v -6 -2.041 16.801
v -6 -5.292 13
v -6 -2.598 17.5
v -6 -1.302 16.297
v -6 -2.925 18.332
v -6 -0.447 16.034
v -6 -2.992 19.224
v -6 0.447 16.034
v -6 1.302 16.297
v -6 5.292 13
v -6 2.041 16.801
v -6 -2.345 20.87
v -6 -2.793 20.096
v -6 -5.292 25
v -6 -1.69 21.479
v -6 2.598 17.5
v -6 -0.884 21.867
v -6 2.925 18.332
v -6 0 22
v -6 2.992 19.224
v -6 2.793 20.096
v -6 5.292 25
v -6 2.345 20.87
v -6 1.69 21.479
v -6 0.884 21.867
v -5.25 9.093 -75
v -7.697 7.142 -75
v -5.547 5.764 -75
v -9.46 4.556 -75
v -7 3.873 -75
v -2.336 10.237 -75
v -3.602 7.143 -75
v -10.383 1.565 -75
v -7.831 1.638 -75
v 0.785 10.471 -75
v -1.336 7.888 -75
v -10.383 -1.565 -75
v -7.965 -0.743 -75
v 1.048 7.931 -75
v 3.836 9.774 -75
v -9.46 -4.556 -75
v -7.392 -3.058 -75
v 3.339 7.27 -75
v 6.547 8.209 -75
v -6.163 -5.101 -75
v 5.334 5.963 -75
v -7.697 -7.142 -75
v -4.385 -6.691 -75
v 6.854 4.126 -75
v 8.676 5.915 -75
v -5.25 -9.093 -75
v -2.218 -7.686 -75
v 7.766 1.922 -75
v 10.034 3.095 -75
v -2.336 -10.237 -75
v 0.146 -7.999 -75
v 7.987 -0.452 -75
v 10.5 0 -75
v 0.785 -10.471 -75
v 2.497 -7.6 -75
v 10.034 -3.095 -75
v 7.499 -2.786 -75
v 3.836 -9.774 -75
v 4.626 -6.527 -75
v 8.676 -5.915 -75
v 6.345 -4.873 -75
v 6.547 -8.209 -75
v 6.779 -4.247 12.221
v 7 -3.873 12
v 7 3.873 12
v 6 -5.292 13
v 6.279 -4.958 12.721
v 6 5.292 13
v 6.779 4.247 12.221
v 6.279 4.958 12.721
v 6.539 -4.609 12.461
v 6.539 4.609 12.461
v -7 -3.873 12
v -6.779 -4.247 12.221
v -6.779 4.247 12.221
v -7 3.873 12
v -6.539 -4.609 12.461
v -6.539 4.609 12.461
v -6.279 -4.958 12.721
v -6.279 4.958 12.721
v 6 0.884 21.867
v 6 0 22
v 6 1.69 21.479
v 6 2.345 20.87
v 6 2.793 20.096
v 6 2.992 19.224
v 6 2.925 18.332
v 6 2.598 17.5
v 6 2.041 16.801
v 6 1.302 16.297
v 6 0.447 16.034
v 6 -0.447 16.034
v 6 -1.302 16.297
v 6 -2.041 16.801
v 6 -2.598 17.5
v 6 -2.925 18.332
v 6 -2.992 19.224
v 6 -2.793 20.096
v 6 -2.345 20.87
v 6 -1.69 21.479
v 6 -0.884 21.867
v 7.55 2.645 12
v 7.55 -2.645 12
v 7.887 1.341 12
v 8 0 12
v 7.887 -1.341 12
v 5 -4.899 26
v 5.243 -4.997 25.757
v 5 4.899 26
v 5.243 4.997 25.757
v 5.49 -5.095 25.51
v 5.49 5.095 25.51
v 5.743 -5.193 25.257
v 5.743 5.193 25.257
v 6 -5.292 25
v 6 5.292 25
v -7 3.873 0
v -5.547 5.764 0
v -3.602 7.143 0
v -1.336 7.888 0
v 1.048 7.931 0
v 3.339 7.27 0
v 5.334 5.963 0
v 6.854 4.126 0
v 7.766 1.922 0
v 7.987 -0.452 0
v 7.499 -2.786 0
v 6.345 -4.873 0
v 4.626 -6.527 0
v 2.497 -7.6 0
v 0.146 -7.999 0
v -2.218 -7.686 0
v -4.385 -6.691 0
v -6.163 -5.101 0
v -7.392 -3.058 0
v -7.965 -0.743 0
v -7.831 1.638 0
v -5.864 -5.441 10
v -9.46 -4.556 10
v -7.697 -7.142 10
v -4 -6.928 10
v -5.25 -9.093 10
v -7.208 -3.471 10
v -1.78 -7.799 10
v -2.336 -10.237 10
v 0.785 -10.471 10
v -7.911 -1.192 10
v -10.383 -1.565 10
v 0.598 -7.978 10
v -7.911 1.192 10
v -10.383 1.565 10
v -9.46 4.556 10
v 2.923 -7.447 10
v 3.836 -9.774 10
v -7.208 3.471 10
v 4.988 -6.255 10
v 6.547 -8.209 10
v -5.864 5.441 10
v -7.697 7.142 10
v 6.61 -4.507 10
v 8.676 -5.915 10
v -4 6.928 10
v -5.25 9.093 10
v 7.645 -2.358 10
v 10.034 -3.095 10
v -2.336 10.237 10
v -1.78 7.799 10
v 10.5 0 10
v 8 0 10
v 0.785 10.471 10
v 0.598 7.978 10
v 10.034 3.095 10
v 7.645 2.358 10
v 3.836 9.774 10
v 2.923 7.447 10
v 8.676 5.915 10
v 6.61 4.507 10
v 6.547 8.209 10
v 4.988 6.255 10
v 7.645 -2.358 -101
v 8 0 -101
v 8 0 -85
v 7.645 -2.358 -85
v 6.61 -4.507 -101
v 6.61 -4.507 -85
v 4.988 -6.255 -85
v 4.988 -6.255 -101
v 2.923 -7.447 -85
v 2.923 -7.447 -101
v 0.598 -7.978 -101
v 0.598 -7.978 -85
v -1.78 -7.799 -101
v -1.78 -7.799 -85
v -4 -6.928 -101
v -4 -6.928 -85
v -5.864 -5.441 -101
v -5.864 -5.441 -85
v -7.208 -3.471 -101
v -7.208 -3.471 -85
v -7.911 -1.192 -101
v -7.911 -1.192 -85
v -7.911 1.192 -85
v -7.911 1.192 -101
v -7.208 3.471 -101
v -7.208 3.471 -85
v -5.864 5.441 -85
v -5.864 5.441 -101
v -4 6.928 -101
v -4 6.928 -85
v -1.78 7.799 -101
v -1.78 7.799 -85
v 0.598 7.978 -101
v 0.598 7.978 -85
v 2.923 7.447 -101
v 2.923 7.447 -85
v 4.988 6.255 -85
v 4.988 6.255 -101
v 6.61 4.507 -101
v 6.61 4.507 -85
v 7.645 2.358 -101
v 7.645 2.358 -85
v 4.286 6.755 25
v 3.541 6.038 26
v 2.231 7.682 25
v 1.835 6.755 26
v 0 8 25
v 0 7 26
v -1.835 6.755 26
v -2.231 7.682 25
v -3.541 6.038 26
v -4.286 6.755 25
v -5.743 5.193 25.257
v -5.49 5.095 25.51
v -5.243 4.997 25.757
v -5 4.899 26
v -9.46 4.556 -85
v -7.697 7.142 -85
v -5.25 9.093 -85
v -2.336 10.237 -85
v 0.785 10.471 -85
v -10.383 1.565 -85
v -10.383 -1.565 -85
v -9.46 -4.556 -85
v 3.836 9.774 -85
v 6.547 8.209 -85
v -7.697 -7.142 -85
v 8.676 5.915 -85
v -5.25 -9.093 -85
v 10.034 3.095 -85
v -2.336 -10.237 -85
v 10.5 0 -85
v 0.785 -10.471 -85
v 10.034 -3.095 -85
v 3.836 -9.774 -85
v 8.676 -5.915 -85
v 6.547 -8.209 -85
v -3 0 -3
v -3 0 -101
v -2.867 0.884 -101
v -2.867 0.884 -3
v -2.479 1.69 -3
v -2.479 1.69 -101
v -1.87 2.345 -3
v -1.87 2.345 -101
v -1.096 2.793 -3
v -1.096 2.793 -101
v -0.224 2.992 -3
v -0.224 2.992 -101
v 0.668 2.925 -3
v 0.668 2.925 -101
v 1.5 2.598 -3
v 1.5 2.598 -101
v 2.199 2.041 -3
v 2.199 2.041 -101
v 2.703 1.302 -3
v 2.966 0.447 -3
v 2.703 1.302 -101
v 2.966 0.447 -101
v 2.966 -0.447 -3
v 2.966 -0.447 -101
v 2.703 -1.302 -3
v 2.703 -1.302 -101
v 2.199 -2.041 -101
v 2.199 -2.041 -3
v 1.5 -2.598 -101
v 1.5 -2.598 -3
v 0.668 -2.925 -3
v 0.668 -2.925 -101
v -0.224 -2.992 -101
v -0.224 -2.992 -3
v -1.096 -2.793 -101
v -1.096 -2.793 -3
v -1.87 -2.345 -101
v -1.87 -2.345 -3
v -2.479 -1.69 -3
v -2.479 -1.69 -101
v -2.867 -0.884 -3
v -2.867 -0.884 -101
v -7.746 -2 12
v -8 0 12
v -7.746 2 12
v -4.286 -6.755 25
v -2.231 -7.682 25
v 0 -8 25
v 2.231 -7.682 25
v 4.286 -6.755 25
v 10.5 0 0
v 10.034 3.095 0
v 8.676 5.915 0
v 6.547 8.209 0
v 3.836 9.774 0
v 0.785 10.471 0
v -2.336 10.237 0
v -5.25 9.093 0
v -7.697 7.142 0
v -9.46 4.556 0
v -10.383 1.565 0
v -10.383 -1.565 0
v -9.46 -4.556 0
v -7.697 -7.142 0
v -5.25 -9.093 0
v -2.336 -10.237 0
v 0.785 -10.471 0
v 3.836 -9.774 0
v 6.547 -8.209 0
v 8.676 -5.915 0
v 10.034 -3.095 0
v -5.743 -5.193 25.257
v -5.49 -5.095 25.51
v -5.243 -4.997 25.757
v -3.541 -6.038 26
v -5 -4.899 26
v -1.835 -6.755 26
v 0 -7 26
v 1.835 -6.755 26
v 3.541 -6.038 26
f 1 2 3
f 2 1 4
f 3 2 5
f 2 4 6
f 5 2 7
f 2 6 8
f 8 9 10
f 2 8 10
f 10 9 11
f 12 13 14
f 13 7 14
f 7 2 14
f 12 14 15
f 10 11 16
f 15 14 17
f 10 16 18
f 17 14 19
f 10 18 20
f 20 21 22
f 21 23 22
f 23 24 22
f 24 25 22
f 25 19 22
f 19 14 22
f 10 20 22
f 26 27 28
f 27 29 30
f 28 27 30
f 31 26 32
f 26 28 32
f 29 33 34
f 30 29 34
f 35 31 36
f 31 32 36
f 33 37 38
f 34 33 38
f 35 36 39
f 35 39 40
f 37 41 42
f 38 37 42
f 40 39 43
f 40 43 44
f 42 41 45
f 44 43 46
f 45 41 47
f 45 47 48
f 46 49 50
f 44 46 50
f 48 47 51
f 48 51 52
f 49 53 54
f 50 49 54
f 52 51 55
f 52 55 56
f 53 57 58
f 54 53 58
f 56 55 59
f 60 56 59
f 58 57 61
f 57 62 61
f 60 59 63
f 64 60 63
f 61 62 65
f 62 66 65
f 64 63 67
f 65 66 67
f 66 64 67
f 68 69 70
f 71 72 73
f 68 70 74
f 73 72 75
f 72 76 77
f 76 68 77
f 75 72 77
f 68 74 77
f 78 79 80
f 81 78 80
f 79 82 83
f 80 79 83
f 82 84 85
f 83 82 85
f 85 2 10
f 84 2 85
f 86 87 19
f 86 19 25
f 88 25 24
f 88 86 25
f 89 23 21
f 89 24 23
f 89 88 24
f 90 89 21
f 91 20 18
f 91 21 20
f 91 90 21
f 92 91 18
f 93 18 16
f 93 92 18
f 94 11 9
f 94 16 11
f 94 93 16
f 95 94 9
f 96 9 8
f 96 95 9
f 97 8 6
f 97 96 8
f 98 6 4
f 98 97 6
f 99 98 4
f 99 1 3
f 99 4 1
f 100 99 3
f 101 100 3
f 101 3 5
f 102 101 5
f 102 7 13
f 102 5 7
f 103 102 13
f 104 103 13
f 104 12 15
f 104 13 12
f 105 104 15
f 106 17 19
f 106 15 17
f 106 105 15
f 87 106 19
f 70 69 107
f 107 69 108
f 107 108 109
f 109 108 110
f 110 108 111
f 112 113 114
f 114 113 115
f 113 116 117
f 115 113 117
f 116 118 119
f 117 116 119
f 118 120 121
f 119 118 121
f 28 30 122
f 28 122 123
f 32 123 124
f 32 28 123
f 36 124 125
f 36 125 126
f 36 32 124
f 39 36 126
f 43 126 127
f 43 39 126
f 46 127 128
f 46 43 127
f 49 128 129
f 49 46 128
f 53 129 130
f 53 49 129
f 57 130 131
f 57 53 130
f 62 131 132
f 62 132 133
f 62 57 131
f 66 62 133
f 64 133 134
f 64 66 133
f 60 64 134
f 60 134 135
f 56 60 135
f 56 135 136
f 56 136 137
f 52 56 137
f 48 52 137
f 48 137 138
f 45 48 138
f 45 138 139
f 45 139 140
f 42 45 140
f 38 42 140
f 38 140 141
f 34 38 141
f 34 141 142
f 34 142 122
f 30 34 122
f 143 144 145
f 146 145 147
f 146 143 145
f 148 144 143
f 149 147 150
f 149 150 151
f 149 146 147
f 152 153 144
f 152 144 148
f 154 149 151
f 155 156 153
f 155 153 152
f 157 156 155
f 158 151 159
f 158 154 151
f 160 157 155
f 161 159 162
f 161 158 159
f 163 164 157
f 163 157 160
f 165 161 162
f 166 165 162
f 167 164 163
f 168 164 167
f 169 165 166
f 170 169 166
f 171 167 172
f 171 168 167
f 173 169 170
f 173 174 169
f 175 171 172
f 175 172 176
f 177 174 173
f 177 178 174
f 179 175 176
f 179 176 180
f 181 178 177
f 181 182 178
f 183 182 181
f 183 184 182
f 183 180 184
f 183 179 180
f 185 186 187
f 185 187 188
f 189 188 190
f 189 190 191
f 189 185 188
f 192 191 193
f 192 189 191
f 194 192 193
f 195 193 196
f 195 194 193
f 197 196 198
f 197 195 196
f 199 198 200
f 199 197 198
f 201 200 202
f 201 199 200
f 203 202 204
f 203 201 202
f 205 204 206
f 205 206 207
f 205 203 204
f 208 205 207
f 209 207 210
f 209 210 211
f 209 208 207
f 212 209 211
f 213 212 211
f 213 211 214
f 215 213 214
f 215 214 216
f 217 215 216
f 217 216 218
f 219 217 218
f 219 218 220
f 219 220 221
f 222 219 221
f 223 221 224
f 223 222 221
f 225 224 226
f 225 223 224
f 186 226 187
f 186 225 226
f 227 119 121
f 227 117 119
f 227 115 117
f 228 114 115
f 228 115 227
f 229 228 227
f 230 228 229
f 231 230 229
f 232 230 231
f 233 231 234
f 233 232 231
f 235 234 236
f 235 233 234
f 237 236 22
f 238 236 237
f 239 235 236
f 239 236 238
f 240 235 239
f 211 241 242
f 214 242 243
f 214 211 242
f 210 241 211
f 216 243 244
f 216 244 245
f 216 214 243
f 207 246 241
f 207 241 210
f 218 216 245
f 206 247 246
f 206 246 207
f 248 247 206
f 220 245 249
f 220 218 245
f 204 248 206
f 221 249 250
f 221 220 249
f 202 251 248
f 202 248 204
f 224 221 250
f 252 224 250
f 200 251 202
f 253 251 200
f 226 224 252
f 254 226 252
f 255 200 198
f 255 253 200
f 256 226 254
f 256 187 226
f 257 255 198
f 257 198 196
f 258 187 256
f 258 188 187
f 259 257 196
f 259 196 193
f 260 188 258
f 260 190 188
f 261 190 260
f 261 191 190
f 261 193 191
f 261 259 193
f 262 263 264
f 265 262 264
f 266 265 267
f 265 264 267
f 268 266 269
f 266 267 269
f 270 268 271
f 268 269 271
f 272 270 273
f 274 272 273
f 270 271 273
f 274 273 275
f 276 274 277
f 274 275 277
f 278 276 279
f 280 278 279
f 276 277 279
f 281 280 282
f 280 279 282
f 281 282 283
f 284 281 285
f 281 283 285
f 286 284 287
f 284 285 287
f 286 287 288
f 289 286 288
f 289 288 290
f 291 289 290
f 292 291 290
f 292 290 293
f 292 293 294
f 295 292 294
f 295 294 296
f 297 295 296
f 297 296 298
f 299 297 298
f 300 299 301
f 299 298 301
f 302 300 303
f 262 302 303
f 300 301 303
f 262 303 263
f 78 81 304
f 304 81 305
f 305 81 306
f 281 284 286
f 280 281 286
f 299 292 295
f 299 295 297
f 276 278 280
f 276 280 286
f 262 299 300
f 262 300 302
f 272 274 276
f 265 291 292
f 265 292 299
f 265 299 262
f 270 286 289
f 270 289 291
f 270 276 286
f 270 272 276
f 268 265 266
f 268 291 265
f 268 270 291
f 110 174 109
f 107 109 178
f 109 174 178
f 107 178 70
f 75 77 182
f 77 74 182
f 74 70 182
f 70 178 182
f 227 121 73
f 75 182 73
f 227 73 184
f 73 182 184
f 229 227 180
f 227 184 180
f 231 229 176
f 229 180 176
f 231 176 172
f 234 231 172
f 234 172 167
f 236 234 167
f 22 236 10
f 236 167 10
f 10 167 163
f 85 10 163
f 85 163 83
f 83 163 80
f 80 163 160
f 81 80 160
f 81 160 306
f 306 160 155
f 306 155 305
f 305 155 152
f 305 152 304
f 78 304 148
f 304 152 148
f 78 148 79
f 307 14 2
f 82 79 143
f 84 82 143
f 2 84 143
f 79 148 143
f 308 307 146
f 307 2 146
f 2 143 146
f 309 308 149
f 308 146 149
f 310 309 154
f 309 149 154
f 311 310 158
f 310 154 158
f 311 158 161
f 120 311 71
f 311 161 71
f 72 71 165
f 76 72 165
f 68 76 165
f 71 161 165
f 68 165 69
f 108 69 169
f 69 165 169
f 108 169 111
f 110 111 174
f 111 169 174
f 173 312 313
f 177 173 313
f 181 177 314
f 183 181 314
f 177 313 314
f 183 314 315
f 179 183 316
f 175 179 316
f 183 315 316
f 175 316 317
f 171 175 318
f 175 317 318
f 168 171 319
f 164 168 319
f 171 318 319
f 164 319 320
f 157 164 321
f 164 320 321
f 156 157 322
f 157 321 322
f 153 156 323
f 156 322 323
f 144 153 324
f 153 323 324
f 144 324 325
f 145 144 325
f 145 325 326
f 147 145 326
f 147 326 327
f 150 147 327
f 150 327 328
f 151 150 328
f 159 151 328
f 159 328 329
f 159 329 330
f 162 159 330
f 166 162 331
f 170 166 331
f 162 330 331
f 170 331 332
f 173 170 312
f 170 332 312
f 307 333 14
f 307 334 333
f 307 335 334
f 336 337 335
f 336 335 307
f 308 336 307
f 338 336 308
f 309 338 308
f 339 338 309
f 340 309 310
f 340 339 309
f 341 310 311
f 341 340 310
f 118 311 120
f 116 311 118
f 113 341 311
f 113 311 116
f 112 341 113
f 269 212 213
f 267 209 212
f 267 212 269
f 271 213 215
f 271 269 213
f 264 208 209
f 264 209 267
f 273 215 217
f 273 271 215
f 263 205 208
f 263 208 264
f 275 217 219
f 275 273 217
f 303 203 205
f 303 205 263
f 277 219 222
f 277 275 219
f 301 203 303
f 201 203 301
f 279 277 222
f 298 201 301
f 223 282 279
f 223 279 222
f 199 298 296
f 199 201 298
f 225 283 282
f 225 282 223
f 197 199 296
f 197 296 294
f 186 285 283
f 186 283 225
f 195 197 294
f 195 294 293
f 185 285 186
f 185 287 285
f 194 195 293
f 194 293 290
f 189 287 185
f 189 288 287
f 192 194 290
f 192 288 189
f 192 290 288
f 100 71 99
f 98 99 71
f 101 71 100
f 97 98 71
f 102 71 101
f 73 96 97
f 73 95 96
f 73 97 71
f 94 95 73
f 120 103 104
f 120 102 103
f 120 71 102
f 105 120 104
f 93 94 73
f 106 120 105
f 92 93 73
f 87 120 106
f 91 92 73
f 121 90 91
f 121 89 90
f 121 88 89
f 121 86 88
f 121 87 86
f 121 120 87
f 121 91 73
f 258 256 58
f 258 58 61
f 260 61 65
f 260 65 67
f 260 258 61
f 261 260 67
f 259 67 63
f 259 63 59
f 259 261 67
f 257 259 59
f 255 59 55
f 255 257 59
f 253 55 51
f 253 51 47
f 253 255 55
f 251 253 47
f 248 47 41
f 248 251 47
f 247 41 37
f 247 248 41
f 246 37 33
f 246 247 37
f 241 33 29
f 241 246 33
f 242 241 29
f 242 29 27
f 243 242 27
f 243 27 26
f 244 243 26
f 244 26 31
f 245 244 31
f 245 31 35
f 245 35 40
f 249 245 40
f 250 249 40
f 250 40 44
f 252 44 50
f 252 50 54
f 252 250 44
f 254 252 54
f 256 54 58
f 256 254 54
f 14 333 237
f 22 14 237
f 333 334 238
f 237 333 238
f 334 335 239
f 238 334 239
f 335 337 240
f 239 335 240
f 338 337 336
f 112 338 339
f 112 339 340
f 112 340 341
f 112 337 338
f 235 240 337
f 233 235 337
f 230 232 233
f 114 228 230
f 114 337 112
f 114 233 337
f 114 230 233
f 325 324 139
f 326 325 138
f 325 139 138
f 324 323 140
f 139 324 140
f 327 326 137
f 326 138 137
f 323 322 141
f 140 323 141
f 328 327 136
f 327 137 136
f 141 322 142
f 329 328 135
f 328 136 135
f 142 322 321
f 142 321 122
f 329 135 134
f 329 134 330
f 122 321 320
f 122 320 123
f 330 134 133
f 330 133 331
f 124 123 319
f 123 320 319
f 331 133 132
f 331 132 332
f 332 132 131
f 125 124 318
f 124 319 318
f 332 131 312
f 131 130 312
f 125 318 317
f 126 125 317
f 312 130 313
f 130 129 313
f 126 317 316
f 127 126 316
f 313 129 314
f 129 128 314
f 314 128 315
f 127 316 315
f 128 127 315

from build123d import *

# Parameters (mm, degrees)
ESQUISSE1_R                  = 10.5
BOSS_EXTRU_1_DEPTH           = 10
ESQUISSE2_R                  = 8
BOSS_EXTRU_2_DEPTH           = 16
ESQUISSE3_W                  = 2
ESQUISSE3_H                  = 16
ENL_V_MAT_EXTRU_1_DEPTH      = 14
CHANFREIN1_SIZE              = 1
ENL_V_MAT_EXTRU_2_DEPTH      = 33.53459697
ENL_V_MAT_EXTRU_2_DEPTH_BACK = 33.53459697
ESQUISSE4_R                  = 3
BOSS_EXTRU_3_START           = 85
ESQUISSE5_R                  = 8
BOSS_EXTRU_3_DEPTH           = 85
ESQUISSE6_R                  = 10.5
BOSS_EXTRU_4_DEPTH           = 10
BOSS_EXTRU_5_START           = 16
ESQUISSE7_R                  = 8
BOSS_EXTRU_5_DEPTH           = 16
ESQUISSE8_R                  = 3
ENL_V_MAT_EXTRU_3_DEPTH      = 98


with BuildPart() as part:
    # Esquisse1 → Boss.-Extru.1 (new body)
    with BuildSketch(Plane.XY):
        Circle(ESQUISSE1_R)
    extrude(amount=BOSS_EXTRU_1_DEPTH)

    # Esquisse2 → Boss.-Extru.2 (add)
    with BuildSketch(Plane.XY.offset(10)):
        Circle(ESQUISSE2_R)
    extrude(amount=BOSS_EXTRU_2_DEPTH)

    # Esquisse3 → Enlèv. mat.-Extru.1 (cut)
    with BuildSketch(Plane.XY.offset(26)):
        with Locations((-7, 0)):
            Rectangle(ESQUISSE3_W, ESQUISSE3_H)
        with Locations((7, 0)):
            Rectangle(ESQUISSE3_W, ESQUISSE3_H)
    extrude(amount=-ENL_V_MAT_EXTRU_1_DEPTH, mode=Mode.SUBTRACT)

    # Chanfrein1
    chanfrein1_edges = [part.edges().sort_by_distance(p)[0] for p in [
        (0, -8, 26),
        (-6, 0, 26),
        (-6, 0, 12),
        (0, 8, 26),
        (6, 0, 26),
        (6, 0, 12),
    ]]
    chamfer(chanfrein1_edges, length=CHANFREIN1_SIZE)

    # Esquisse4 → Enlèv. mat.-Extru.2 (cut, two sides: drawn at the far end of the back side and taken through both)
    with BuildSketch(Plane.ZY.offset(6).offset(-ENL_V_MAT_EXTRU_2_DEPTH_BACK)):
        with Locations((19, 0)):
            Circle(ESQUISSE4_R)
    extrude(amount=ENL_V_MAT_EXTRU_2_DEPTH + ENL_V_MAT_EXTRU_2_DEPTH_BACK, mode=Mode.SUBTRACT)

    # Esquisse5 → Boss.-Extru.3 (add)
    with BuildSketch(Plane(origin=(0, 0, 0), x_dir=(-1, 0, 0), z_dir=(0, 0, -1)).offset(BOSS_EXTRU_3_START)):
        with Locations(Location((0, 0, 0), (0, 0, 28.955024372))):
            Circle(ESQUISSE5_R)
    extrude(amount=-BOSS_EXTRU_3_DEPTH)

    # Esquisse6 → Boss.-Extru.4 (add)
    with BuildSketch(Plane(origin=(0, 0, -85), x_dir=(-1, 0, 0), z_dir=(0, 0, -1))):
        with Locations(Location((0, 0, 0), (0, 0, 180))):
            Circle(ESQUISSE6_R)
    extrude(amount=-BOSS_EXTRU_4_DEPTH)

    # Esquisse7 → Boss.-Extru.5 (add)
    with BuildSketch(Plane(origin=(0, 0, -85), x_dir=(-1, 0, 0), z_dir=(0, 0, -1)).offset(BOSS_EXTRU_5_START)):
        with Locations(Location((0, 0, 0), (0, 0, 180))):
            Circle(ESQUISSE7_R)
    extrude(amount=-BOSS_EXTRU_5_DEPTH)

    # Esquisse8 → Enlèv. mat.-Extru.3 (cut)
    with BuildSketch(Plane(origin=(0, 0, -101), x_dir=(-1, 0, 0), z_dir=(0, 0, -1))):
        Circle(ESQUISSE8_R)
    extrude(amount=-ENL_V_MAT_EXTRU_3_DEPTH, mode=Mode.SUBTRACT)


solid = part.part
